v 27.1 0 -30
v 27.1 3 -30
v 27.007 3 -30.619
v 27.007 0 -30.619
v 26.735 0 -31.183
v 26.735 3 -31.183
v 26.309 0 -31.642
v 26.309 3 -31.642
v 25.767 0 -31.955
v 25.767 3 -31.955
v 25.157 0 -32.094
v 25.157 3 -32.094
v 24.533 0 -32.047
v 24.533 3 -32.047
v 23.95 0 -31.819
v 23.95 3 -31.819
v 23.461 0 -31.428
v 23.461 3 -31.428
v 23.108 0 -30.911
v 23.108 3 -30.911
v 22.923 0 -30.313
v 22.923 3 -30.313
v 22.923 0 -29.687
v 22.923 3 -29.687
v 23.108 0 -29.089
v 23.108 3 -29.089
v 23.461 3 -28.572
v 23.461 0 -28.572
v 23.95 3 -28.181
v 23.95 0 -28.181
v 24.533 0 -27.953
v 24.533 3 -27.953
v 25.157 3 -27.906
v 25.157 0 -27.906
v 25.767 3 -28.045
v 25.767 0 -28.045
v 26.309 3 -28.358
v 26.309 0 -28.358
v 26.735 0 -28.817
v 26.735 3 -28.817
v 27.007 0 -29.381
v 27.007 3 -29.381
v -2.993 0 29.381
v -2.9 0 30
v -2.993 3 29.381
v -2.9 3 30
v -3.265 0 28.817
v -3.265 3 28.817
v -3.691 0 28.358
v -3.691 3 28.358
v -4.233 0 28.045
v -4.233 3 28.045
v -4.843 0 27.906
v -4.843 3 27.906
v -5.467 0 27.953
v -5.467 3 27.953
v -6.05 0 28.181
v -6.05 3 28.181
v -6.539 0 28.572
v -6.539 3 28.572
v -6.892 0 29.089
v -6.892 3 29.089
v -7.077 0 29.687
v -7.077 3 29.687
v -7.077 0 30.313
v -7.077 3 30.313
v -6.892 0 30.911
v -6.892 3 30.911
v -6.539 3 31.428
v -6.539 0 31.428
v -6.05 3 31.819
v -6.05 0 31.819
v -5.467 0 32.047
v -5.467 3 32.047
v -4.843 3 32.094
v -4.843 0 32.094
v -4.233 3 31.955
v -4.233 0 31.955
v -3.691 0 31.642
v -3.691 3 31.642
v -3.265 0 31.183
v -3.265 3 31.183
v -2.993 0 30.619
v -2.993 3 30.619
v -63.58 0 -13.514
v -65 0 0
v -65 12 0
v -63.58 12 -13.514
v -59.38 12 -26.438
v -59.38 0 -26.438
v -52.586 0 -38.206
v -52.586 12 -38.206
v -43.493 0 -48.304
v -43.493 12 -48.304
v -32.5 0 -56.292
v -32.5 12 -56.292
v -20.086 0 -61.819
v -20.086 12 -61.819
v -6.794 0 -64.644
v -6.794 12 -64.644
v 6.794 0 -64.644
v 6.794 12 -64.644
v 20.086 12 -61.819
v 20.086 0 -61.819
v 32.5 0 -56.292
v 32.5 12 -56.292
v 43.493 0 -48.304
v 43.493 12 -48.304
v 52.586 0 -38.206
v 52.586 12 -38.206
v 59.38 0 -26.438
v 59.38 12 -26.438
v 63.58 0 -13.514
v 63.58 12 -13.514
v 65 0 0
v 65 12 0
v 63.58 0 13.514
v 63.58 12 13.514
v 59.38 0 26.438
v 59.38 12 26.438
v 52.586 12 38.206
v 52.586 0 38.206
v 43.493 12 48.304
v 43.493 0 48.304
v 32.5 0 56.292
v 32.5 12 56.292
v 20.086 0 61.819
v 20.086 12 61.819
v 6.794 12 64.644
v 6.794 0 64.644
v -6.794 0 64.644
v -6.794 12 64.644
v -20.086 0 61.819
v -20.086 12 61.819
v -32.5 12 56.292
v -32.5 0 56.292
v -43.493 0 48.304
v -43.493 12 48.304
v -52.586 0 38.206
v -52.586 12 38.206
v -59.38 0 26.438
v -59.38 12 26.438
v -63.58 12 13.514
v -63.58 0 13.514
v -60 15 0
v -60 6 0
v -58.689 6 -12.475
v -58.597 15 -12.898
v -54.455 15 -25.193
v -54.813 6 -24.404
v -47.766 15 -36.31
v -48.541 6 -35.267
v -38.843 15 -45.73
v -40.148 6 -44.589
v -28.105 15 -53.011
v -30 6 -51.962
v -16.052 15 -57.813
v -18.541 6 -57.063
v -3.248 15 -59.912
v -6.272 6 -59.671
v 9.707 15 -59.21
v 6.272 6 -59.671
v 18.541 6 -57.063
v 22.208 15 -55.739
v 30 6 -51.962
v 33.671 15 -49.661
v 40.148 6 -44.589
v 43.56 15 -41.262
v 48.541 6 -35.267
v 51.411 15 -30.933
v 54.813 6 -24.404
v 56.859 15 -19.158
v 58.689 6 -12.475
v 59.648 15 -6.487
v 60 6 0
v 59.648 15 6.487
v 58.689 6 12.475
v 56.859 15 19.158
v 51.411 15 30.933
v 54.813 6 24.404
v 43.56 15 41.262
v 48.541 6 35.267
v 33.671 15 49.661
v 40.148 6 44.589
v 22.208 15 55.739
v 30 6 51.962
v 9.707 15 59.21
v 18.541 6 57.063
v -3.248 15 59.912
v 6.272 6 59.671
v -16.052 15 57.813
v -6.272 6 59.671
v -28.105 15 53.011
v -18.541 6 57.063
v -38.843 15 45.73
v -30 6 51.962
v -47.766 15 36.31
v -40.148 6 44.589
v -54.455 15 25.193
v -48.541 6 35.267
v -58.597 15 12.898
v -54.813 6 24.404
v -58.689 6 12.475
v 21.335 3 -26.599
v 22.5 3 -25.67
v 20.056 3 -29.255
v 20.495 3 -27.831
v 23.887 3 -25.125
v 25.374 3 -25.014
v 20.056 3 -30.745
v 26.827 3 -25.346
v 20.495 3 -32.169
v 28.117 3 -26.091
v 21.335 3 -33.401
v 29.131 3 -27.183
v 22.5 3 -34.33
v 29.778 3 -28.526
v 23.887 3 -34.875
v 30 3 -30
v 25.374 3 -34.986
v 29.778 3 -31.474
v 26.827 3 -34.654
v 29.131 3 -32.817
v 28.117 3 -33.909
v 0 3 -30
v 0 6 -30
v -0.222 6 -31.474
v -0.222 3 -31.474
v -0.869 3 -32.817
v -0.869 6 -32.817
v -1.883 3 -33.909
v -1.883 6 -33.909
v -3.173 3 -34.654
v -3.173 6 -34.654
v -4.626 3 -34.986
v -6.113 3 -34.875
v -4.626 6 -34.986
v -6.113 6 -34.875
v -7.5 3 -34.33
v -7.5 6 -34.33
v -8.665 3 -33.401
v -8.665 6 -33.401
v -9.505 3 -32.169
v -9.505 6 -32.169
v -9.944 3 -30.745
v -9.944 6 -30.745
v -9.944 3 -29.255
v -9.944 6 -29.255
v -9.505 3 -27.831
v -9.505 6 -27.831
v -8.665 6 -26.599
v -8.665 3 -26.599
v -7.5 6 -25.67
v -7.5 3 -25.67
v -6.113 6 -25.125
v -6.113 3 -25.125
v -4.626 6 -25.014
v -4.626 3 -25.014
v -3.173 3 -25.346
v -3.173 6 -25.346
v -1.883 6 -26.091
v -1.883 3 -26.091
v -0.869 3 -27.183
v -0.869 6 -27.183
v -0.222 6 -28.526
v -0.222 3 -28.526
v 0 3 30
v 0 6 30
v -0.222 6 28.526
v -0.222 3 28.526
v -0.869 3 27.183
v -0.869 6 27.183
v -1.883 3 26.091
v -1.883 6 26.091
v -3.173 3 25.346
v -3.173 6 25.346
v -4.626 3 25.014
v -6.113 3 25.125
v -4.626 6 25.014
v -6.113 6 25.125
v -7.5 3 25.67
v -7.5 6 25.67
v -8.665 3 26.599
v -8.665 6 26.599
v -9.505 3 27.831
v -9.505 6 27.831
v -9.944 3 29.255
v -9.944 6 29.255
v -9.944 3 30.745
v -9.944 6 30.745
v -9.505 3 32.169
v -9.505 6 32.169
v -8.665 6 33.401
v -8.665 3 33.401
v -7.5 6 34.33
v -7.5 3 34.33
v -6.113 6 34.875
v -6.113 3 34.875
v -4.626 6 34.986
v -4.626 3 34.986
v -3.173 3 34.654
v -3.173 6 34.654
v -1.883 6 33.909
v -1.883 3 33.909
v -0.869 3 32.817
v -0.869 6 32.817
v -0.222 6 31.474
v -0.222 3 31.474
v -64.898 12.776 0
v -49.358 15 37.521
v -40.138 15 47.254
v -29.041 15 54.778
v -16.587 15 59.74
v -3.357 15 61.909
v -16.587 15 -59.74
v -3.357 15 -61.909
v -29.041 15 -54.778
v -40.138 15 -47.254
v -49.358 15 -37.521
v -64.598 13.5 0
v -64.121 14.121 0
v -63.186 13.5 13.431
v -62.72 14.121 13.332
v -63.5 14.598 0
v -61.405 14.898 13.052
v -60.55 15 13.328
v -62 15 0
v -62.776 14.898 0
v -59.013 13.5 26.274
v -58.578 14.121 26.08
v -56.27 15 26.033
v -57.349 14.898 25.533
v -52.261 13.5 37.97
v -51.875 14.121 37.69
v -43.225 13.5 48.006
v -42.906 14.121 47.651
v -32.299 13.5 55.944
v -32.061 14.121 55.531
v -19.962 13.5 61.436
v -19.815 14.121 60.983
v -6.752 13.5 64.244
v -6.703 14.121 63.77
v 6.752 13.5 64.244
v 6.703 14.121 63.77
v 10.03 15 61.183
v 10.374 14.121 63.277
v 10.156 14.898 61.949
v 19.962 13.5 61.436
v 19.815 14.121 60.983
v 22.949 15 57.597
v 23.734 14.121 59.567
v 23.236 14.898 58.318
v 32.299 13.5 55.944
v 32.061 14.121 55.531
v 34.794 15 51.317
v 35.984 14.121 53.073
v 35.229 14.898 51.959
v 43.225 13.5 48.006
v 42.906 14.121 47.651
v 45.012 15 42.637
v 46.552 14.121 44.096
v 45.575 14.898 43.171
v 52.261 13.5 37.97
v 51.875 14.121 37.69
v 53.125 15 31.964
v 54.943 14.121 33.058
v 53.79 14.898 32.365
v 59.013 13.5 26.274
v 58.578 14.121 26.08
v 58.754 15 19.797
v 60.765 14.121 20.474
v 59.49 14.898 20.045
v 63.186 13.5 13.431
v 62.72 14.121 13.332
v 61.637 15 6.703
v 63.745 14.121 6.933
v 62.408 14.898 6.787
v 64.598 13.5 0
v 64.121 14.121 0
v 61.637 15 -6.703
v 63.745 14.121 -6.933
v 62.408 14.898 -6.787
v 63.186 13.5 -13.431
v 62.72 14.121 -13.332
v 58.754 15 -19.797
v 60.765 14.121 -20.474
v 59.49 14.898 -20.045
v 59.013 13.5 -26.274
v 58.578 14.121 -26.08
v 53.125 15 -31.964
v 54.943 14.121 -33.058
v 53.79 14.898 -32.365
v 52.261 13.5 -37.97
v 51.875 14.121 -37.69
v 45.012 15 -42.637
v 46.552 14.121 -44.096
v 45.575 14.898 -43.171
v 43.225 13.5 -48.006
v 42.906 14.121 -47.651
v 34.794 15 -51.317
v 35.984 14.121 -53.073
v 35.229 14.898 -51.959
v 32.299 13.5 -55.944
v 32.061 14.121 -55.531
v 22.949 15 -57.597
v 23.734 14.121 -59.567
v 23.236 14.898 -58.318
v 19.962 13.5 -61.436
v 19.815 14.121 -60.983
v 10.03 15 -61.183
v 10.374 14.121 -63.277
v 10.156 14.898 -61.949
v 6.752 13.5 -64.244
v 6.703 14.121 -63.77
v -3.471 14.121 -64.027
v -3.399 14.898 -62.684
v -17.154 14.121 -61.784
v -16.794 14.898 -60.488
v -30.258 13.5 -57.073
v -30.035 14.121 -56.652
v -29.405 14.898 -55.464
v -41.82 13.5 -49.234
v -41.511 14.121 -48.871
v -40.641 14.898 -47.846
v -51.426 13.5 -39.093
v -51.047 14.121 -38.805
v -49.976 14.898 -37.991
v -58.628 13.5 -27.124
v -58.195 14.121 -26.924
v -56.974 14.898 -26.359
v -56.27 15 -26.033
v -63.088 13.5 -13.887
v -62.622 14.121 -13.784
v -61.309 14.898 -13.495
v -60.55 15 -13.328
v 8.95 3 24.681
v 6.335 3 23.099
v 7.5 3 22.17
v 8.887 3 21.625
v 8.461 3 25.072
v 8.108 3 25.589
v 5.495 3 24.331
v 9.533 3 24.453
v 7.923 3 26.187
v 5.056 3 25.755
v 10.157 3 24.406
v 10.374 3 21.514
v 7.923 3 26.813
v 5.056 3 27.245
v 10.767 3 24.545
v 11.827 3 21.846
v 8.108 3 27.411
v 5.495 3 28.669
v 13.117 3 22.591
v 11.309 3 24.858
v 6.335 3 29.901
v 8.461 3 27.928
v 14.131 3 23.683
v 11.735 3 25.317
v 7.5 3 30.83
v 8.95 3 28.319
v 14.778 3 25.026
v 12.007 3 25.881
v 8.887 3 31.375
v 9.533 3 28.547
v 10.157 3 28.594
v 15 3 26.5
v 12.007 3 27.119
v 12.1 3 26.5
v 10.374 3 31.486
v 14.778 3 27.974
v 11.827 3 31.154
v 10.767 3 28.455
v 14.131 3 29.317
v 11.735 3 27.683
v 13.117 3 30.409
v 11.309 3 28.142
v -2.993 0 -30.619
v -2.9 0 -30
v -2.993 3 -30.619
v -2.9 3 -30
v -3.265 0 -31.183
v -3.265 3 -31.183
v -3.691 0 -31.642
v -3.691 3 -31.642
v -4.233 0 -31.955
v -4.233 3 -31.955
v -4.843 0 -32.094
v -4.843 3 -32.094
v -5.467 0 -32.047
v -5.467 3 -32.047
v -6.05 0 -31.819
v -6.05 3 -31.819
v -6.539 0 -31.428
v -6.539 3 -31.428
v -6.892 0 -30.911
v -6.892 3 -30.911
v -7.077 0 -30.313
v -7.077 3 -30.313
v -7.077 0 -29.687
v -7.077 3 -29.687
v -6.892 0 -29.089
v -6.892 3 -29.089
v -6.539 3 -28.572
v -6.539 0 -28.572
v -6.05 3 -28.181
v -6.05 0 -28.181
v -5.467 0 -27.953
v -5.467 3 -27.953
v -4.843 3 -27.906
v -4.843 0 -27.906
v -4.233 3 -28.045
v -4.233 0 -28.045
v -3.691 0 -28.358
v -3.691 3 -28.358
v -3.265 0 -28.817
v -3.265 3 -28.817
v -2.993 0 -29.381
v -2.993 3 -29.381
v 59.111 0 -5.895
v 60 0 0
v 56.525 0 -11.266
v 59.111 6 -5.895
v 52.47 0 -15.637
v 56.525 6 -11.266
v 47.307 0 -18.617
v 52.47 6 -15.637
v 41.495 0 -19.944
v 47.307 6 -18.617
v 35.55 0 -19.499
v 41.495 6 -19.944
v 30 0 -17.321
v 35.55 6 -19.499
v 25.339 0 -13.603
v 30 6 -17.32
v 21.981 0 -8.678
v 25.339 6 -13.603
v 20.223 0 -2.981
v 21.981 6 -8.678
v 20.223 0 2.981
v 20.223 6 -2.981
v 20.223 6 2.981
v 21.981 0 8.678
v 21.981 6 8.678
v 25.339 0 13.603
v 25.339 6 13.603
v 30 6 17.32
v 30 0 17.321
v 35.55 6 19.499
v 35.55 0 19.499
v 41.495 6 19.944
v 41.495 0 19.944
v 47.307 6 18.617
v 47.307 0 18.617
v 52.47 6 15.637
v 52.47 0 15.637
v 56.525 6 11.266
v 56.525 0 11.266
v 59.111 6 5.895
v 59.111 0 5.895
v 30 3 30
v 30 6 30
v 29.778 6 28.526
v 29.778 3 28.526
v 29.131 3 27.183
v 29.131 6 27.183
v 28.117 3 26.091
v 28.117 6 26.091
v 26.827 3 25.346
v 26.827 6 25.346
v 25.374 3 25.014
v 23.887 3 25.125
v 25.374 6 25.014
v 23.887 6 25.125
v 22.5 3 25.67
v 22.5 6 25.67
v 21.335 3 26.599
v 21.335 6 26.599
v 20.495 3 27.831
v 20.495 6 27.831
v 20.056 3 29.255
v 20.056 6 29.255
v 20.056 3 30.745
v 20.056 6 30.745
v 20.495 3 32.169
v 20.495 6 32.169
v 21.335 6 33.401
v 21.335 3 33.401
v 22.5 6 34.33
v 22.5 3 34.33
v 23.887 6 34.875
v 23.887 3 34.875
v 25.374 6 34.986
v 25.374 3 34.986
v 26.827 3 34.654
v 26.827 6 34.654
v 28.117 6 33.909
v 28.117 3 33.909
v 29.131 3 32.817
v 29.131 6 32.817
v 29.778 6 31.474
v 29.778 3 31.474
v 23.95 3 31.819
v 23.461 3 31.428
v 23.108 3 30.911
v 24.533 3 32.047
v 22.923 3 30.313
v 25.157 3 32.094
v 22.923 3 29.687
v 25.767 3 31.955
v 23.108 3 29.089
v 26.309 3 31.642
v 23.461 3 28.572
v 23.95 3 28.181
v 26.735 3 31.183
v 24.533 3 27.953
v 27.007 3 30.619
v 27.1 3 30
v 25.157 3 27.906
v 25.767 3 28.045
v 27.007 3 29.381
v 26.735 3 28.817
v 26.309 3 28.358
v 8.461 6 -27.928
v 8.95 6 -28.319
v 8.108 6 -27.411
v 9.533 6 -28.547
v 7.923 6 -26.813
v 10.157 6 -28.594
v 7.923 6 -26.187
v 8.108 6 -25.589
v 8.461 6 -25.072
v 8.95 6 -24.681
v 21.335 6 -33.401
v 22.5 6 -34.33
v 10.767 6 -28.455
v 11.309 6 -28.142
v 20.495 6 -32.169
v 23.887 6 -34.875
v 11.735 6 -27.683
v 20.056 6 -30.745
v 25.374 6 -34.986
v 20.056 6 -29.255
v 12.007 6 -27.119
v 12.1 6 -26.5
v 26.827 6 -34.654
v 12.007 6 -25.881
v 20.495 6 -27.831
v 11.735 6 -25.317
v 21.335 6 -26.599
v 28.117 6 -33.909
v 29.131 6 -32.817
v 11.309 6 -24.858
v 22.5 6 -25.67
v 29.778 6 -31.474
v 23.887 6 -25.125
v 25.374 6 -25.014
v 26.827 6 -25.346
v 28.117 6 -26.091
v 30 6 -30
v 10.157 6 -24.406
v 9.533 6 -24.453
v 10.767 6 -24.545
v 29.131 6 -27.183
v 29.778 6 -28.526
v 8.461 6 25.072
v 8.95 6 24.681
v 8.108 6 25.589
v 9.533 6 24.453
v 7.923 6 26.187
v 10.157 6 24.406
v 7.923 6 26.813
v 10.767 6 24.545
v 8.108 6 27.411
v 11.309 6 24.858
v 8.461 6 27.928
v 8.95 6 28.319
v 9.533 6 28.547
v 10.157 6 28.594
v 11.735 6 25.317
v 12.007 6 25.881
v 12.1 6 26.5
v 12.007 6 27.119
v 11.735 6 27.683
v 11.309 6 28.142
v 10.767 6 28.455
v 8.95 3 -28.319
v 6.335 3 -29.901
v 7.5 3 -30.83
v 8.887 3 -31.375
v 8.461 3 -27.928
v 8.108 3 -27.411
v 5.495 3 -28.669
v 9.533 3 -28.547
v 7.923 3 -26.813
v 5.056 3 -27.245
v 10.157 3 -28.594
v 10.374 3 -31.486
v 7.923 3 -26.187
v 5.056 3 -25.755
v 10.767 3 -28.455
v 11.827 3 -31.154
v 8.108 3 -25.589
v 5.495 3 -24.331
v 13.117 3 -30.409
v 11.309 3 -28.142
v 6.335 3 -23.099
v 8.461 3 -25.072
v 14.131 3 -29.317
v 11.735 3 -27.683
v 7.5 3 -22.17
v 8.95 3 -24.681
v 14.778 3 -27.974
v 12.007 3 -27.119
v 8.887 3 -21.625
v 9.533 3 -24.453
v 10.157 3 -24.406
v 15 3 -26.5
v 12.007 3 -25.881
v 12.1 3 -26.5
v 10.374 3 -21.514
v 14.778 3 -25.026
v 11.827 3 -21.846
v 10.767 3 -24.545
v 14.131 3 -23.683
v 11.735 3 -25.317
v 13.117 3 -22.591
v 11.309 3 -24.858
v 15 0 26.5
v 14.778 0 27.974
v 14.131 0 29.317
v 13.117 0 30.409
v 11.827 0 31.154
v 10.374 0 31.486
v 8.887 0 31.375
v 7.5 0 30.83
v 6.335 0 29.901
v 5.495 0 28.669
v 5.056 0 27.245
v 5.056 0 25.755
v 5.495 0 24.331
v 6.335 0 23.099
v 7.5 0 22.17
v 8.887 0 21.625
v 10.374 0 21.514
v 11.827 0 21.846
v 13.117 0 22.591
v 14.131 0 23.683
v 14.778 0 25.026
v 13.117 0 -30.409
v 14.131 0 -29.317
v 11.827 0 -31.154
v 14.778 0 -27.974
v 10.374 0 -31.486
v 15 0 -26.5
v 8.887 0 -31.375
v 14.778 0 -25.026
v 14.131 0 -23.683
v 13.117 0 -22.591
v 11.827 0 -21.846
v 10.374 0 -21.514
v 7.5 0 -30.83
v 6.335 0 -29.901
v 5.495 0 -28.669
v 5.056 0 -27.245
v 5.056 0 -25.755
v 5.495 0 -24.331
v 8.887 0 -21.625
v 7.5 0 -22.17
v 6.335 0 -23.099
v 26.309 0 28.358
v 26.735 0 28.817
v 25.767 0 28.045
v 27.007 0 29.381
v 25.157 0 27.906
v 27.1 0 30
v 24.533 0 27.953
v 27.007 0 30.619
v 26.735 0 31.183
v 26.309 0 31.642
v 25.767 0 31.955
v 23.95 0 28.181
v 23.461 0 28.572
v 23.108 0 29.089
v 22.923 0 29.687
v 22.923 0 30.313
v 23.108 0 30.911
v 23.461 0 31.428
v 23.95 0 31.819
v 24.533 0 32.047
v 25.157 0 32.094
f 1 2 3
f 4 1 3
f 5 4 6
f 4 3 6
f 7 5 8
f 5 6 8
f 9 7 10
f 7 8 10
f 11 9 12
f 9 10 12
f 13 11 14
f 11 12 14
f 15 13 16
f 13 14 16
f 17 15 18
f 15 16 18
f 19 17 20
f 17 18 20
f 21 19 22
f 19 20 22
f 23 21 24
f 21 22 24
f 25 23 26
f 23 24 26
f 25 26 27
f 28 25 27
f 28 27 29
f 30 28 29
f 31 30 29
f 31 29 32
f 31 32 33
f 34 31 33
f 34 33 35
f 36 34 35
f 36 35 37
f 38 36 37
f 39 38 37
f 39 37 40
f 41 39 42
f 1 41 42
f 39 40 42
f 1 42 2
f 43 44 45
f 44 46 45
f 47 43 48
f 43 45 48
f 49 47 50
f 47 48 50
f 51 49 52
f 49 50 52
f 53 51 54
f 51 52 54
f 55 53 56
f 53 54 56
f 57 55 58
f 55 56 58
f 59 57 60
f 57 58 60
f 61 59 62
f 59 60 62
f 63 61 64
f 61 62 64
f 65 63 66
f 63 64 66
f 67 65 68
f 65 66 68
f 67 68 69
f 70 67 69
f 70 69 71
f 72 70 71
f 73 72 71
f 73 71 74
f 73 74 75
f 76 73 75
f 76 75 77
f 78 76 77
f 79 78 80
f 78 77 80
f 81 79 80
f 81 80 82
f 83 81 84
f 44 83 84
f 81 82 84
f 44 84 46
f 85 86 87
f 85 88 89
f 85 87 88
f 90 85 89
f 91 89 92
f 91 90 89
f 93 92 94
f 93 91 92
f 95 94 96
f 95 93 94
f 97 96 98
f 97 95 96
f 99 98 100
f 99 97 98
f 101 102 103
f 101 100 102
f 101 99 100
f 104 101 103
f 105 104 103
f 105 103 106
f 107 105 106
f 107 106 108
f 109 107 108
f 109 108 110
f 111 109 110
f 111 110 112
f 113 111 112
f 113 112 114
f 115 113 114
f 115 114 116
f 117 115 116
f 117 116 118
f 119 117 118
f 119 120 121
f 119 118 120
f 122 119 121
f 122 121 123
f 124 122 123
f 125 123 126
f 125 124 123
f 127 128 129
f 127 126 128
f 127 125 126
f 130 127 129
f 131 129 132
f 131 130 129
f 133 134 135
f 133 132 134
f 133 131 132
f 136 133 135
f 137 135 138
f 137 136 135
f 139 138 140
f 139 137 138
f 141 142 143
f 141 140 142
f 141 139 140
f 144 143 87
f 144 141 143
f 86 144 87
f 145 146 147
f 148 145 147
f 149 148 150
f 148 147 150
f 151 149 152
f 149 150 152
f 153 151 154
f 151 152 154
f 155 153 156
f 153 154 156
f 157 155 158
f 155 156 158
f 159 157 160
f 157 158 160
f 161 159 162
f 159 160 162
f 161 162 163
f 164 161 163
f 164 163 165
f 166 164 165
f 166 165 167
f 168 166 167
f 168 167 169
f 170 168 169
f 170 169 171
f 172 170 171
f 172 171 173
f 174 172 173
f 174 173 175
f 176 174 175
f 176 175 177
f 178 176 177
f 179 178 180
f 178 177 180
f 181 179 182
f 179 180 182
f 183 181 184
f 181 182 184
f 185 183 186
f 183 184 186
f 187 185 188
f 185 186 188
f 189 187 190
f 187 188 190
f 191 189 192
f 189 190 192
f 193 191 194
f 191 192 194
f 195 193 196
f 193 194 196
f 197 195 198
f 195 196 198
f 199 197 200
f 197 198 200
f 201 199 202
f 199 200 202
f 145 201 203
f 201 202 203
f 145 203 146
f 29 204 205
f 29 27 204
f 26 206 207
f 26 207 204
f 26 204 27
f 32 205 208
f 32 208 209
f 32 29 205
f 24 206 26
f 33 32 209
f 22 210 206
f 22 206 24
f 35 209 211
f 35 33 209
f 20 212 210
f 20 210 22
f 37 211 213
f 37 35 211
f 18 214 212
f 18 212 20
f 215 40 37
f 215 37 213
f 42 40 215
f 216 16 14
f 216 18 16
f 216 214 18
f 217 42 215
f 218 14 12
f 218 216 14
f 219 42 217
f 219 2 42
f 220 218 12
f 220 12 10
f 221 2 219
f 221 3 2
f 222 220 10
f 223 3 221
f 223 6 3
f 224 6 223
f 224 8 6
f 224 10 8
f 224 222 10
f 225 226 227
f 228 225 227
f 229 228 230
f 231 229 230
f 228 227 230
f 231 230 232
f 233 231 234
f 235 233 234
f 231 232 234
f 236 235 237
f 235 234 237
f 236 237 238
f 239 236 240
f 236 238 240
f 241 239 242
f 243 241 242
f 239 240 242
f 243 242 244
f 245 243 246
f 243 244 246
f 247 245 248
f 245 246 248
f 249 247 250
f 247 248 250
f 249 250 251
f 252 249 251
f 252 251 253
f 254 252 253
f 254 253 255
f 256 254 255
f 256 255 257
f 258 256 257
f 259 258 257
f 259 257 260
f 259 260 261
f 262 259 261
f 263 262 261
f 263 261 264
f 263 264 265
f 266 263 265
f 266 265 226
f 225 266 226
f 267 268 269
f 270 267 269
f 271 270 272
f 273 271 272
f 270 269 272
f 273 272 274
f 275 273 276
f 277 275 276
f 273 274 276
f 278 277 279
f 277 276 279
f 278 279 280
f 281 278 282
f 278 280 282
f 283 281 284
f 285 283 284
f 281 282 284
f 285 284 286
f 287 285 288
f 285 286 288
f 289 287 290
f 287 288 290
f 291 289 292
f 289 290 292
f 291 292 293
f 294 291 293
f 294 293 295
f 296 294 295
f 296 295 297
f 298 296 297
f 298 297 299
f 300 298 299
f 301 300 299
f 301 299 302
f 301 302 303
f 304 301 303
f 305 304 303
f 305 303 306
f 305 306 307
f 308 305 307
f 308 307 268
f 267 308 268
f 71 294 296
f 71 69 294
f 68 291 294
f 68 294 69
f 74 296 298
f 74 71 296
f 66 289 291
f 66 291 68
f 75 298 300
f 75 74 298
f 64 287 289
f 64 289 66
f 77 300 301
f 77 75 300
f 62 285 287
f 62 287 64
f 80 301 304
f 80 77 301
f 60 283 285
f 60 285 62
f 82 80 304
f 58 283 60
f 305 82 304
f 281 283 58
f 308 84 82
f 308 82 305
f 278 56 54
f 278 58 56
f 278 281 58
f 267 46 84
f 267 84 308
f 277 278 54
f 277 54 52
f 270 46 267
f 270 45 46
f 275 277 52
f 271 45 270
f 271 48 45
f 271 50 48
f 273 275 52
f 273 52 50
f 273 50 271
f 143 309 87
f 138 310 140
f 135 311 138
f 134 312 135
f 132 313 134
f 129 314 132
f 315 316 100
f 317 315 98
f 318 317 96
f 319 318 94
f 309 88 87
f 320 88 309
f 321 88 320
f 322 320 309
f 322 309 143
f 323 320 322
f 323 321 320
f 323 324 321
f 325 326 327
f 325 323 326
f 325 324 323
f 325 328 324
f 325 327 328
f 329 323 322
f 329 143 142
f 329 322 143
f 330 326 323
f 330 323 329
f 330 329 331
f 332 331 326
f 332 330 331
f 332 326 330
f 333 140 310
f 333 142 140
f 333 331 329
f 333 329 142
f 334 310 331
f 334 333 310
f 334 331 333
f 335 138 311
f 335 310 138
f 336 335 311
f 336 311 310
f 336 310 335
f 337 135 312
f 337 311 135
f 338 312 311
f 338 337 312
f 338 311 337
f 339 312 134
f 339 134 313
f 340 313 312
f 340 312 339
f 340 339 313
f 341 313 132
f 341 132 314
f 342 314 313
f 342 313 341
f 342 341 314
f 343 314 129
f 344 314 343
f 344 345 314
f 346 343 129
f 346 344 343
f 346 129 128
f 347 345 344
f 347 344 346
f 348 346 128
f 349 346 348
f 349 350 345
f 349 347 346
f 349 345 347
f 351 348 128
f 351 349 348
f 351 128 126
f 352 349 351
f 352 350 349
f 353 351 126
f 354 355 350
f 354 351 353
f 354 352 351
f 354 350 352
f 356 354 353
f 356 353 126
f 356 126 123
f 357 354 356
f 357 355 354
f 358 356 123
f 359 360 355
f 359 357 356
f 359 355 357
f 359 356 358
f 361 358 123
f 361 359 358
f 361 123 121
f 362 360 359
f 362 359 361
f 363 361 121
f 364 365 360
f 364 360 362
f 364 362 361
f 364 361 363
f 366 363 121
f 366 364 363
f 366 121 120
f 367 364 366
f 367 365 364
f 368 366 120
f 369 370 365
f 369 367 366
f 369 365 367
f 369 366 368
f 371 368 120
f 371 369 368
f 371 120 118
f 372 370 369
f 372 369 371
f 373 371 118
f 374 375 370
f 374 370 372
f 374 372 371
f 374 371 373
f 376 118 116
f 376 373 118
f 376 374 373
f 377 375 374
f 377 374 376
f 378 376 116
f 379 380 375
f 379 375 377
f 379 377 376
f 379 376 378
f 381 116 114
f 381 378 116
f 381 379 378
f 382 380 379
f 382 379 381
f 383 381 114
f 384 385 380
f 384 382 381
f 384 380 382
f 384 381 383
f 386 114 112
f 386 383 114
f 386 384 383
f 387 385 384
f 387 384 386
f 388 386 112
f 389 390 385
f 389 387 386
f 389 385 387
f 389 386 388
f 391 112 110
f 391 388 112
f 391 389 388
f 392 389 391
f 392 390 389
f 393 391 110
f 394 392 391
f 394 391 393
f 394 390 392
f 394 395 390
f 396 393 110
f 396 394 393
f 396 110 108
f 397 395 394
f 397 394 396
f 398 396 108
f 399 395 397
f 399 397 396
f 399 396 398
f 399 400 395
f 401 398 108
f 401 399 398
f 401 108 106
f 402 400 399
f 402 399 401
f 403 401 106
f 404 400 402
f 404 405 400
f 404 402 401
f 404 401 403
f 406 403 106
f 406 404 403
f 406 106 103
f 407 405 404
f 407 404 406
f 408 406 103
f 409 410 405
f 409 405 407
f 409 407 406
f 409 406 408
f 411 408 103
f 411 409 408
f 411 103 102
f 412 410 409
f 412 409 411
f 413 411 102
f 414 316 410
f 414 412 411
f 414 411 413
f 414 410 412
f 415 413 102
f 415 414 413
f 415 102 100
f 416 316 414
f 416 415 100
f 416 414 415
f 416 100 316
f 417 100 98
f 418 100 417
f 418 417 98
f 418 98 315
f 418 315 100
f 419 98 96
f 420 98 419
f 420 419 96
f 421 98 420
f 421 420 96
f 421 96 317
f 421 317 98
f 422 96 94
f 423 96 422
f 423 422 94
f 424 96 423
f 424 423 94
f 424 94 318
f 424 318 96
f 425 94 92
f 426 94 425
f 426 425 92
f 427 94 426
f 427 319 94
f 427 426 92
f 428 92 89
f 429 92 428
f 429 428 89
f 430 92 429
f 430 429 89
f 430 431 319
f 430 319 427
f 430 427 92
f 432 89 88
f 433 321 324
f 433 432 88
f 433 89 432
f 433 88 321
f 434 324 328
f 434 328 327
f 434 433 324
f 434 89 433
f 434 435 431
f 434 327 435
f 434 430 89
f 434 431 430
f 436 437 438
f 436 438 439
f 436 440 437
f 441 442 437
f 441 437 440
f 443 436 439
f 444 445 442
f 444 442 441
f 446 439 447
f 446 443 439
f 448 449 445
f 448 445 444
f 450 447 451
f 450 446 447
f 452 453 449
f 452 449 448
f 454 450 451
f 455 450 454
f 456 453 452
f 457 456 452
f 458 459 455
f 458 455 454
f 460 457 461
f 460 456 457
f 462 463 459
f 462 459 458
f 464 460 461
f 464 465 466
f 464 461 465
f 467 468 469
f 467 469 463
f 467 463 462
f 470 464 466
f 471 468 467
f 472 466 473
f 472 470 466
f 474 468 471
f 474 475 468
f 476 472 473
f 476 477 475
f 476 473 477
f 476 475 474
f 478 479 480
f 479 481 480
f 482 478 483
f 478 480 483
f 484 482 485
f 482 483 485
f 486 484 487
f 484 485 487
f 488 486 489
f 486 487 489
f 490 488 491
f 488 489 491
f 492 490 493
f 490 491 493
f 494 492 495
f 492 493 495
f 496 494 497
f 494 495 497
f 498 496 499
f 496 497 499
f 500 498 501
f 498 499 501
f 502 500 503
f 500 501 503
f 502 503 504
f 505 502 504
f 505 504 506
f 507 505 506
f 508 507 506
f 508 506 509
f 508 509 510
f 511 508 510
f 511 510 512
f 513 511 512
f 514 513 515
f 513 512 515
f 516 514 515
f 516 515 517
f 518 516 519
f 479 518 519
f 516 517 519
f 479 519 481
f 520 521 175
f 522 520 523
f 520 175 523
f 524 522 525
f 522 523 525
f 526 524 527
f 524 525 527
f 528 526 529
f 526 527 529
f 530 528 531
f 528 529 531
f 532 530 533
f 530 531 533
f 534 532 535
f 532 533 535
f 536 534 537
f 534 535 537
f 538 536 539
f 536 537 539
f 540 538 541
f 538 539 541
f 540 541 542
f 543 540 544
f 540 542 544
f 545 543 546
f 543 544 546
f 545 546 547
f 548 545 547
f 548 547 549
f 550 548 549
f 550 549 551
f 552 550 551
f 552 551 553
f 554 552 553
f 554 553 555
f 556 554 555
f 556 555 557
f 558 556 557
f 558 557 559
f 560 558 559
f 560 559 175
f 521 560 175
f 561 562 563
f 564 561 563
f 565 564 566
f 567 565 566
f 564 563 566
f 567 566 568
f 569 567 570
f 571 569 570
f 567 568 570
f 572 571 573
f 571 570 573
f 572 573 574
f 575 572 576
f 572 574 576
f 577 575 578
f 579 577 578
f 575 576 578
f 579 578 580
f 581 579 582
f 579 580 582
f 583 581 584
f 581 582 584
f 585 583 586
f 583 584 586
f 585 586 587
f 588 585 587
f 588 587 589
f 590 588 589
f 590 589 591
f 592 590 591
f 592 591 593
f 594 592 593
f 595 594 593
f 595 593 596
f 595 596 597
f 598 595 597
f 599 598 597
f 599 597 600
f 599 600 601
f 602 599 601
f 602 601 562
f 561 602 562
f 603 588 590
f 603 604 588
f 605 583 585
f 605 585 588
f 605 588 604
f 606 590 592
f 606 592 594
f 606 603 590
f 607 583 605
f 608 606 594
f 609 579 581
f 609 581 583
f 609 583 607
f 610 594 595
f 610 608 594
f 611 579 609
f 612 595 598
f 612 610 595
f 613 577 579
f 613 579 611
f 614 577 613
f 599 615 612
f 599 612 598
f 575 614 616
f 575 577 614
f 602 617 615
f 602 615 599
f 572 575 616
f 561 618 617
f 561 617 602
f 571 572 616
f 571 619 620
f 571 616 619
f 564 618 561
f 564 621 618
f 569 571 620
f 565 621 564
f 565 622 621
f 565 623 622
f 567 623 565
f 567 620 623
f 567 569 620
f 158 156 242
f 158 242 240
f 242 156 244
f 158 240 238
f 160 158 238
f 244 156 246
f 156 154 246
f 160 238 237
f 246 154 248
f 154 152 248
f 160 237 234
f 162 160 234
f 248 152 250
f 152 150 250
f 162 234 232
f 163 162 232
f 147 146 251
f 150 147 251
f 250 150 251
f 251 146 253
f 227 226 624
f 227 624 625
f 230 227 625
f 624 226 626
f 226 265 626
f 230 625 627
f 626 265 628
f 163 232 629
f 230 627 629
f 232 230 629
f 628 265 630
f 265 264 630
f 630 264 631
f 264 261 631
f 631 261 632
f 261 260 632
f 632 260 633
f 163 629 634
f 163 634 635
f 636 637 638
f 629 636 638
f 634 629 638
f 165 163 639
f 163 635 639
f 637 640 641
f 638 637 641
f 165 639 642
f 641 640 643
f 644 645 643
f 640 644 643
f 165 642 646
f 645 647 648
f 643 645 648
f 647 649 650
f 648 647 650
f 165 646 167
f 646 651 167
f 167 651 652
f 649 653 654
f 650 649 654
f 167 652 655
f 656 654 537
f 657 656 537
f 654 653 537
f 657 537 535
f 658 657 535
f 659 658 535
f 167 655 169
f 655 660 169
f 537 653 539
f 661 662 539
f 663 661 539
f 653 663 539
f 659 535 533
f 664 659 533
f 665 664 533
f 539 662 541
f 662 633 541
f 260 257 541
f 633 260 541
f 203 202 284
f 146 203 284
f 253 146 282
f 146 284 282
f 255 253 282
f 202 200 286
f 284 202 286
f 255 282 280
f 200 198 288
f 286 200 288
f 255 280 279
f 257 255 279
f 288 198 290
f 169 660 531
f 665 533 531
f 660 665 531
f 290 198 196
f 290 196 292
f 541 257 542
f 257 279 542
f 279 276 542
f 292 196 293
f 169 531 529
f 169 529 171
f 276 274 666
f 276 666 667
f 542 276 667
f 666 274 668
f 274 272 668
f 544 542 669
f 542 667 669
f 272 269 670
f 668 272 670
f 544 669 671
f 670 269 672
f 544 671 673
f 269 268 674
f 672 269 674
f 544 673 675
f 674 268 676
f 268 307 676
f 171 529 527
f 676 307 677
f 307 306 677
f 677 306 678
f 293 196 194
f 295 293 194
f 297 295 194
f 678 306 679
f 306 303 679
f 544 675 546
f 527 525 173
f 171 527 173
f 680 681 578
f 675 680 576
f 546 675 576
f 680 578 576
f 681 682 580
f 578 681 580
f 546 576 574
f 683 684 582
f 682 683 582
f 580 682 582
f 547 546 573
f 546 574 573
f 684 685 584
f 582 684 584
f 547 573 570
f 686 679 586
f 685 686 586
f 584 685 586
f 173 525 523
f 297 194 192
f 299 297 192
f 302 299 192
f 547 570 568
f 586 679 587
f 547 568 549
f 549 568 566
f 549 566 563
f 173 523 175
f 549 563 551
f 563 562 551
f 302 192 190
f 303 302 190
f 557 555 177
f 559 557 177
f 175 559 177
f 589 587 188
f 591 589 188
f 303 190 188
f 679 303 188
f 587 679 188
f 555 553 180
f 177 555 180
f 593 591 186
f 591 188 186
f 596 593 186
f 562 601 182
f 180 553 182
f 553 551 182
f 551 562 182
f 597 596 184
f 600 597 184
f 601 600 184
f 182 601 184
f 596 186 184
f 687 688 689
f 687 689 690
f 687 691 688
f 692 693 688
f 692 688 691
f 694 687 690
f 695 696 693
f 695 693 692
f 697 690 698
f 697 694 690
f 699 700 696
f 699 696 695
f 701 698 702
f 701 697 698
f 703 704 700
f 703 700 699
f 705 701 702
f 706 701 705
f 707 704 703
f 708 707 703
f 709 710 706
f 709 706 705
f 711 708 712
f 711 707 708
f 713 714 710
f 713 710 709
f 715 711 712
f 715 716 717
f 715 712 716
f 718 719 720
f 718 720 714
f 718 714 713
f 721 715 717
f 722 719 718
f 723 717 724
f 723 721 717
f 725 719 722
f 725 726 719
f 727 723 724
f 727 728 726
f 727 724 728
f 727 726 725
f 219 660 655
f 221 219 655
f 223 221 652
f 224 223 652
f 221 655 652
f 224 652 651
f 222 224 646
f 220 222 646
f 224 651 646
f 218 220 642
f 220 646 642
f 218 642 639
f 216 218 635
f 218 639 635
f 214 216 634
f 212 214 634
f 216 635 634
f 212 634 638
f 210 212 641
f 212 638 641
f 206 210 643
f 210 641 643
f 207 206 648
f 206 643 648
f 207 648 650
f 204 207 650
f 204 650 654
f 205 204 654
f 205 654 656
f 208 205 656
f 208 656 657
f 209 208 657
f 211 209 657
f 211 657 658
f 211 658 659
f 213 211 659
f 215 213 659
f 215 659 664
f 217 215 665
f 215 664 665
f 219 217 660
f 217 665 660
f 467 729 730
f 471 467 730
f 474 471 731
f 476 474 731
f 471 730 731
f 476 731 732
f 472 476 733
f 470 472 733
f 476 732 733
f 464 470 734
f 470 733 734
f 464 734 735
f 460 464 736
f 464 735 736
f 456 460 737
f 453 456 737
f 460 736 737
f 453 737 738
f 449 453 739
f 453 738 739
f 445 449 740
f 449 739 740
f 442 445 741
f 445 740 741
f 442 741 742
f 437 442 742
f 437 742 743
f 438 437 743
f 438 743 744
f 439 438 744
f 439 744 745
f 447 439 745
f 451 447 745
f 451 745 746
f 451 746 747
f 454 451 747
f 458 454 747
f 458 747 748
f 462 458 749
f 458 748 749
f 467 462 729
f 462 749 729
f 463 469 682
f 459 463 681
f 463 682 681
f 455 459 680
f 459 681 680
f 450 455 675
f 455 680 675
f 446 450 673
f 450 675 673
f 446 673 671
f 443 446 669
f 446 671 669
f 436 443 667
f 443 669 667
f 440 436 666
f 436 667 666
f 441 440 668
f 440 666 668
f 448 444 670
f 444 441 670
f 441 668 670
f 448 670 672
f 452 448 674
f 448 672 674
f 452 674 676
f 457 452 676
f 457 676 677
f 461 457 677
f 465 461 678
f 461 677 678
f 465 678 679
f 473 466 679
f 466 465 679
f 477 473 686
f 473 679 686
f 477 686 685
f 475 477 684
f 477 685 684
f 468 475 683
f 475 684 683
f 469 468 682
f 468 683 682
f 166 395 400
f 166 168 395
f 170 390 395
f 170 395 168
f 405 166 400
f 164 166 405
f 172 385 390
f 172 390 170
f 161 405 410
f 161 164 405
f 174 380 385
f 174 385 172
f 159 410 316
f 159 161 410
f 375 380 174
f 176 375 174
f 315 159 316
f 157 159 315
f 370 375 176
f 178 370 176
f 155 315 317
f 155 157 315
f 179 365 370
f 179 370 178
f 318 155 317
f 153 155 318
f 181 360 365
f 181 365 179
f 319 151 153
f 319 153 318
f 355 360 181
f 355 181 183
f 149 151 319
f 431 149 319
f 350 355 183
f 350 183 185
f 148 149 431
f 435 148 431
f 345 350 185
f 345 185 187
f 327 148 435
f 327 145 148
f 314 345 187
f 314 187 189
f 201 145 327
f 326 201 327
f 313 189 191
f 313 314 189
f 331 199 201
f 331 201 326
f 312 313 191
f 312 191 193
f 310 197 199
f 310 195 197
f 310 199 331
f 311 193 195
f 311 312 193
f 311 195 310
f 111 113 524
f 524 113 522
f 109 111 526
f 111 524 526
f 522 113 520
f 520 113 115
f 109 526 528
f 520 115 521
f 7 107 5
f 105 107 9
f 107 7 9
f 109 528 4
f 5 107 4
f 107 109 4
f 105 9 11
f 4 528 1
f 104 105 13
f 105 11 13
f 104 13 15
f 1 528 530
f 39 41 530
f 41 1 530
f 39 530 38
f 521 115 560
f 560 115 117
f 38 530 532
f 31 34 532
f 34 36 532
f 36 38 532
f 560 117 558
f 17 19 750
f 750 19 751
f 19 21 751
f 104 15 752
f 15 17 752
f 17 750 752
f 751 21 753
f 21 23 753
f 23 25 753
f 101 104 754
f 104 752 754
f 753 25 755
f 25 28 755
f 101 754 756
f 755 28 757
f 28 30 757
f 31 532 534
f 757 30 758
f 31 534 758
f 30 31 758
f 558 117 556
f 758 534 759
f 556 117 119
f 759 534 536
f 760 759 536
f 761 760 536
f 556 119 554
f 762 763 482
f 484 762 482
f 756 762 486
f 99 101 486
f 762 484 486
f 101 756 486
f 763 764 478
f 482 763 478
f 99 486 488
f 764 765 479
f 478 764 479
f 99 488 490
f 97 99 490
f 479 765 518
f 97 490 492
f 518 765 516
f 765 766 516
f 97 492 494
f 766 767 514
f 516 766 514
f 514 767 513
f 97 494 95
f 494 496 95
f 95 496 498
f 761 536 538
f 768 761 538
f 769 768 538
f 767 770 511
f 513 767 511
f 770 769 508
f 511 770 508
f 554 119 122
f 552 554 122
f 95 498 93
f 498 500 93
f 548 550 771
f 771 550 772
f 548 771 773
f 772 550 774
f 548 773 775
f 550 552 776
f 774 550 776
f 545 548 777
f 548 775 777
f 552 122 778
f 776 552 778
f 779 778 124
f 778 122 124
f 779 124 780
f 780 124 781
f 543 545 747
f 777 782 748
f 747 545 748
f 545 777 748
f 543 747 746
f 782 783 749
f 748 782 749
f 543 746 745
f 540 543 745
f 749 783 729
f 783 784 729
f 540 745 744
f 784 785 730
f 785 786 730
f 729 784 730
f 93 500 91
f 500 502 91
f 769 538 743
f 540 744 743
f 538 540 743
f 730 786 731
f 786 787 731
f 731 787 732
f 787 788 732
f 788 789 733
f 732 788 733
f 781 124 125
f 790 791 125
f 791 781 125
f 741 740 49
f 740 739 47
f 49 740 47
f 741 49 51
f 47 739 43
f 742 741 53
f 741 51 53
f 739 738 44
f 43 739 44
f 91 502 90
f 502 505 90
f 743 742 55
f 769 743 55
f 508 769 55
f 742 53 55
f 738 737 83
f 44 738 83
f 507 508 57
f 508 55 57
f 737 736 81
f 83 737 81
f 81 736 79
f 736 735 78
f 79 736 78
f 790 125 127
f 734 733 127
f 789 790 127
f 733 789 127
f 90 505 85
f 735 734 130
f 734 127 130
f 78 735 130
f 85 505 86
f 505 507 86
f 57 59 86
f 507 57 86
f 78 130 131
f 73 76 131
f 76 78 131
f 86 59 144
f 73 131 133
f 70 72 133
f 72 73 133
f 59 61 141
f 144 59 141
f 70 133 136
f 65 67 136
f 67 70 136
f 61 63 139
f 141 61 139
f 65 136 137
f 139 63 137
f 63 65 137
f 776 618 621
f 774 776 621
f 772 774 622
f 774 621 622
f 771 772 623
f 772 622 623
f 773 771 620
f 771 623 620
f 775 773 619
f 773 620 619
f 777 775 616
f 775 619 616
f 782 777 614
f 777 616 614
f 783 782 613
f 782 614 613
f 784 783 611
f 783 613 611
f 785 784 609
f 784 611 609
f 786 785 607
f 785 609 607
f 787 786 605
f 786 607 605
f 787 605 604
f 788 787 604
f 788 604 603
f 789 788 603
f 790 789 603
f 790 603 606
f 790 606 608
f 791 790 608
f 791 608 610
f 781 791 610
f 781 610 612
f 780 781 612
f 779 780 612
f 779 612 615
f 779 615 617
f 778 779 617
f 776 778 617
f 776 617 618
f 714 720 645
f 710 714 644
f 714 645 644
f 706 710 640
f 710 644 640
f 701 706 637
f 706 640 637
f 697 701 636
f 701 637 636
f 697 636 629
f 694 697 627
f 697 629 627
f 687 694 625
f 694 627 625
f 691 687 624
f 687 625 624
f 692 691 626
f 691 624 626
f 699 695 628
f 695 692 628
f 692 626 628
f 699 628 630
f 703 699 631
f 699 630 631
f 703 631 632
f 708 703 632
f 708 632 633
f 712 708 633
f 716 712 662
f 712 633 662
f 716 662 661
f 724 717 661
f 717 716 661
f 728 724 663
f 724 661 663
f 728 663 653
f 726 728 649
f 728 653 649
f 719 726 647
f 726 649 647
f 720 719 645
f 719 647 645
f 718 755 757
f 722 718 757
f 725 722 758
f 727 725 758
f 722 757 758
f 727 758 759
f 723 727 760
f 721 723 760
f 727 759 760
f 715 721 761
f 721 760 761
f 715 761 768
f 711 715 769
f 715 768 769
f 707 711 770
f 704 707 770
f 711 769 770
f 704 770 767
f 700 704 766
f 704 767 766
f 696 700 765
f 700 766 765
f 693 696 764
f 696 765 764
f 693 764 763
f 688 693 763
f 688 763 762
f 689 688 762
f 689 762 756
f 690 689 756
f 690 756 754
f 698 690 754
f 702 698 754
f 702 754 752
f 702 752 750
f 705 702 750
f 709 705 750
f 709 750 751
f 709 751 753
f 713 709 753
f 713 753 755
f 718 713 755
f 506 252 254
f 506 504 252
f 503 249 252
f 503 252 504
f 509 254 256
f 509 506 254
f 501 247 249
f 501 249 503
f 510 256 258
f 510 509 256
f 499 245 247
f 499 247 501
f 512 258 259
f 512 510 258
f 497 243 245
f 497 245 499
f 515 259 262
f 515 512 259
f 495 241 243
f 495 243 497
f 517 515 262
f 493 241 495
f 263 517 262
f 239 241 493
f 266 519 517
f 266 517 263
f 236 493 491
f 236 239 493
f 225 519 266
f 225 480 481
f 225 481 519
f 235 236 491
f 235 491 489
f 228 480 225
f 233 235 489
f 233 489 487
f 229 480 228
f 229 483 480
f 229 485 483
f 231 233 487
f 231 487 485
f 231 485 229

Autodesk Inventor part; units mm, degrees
ref_plane "YZ Plane" through (0, 0, 0) normal (1, 0, 0) x (0, 1, 0)
ref_plane "XZ Plane" through (0, 0, 0) normal (0, 1, 0) x (-1, 0, 0)
ref_plane "XY Plane" through (0, 0, 0) normal (0, 0, 1) x (1, 0, 0)
sketch "Sketch1" plane through (0, 0, 0) normal (0, 1, 0) x (-1, 0, 0)
  circle A0 centre (0, 0) radius 60
  circle A1 centre (0, 0) radius 65
  dimension "d0" = 120
  dimension "d1" = 130
extrude "Extrusion1" add sketch "Sketch1" along normal blind 15
sketch "Sketch4" plane through (0, 0, 0) normal (0, -1, 0) x (1, 0, 0)
  circle A0 centre (0, 0) radius 60 projected
  circle A1 centre (0, 0) radius 60
extrude "Extrusion4" add sketch "Sketch4" against normal blind 6
sketch "Sketch5" plane through (0, 6, 0) normal (0, 1, 0) x (1, 0, 0)
  circle A0 centre (25, -30) radius 2.1
  circle A1 centre (25, 30) radius 2.1
  circle A2 centre (-5, 30) radius 2.1
  circle A3 centre (-5, -30) radius 2.1
  point P0 (0, 0)
  dimension "d19" = 4.2
  dimension "d20" = 4.2
  dimension "d21" = 4.2
  dimension "d22" = 4.2
  dimension "d23" = 30
  dimension "d24" = 30
  dimension "d25" = 5
  dimension "d26" = 25
extrude "Extrusion5" cut sketch "Sketch5" against normal blind 6
sketch "Sketch6" plane through (0, 6, 0) normal (0, 1, 0) x (1, 0, 0)
  circle A0 centre (10, -26.5) radius 2.1
  circle A1 centre (10, 26.5) radius 2.1
  point P0 (0, 0)
  dimension "d29" = 4.2
  dimension "d30" = 4.2
  dimension "d51" = 26.5
  dimension "d52" = 26.5
  dimension "d54" = 10
extrude "Extrusion6" cut sketch "Sketch6" against normal blind 6
sketch "Sketch7" plane through (0, 6, 0) normal (0, 1, 0) x (1, 0, 0)
  circle A0 centre (40, 0) radius 20
  point P0 (0, 0)
  dimension "d35" = 40
  dimension "d39" = 40
extrude "Extrusion7" cut sketch "Sketch7" against normal blind 6
sketch "Sketch8" plane through (0, 6, 0) normal (0, 1, 0) x (1, 0, 0)
  circle A0 centre (0, 0) radius 60 projected
  circle A1 centre (40, 0) radius 20 projected
  circle A2 centre (25, 30) radius 2.1 projected
  circle A3 centre (-5, 30) radius 2.1 projected
  circle A4 centre (25, -30) radius 2.1 projected
  circle A5 centre (-5, -30) radius 2.1 projected
  circle A6 centre (10, 26.5) radius 2.1 projected
  circle A7 centre (10, -26.5) radius 2.1 projected
  circle A8 centre (25, 30) radius 5
  circle A9 centre (25, -30) radius 5
  circle A10 centre (-5, 30) radius 5
  circle A11 centre (-5, -30) radius 5
  point P0 (60, 0)
  dimension "d40" = 10
  dimension "d41" = 10
  dimension "d42" = 10
  dimension "d43" = 10
extrude "Extrusion8" cut sketch "Sketch8" against normal blind 3 contours A8 | A9 | A10 | A11
sketch "Sketch9" plane through (0, 0, 0) normal (0, -1, 0) x (1, 0, 0)
  circle A0 centre (40, 0) radius 20 projected
  circle A1 centre (10, 26.5) radius 2.1 projected
  circle A2 centre (10, -26.5) radius 2.1 projected
  circle A3 centre (-5, 30) radius 2.1 projected
  circle A4 centre (25, 30) radius 2.1 projected
  circle A5 centre (-5, -30) radius 2.1 projected
  circle A6 centre (25, -30) radius 2.1 projected
  circle A7 centre (0, 0) radius 65 projected
  circle A8 centre (10, 26.5) radius 5
  circle A9 centre (10, -26.5) radius 5
  dimension "d46" = 10
  dimension "d47" = 10
extrude "Extrusion9" cut sketch "Sketch9" against normal blind 3 contours A8 | A9
fillet "Fillet1" radius 3 1 edges at (65, 15, 0)
properties part number "siren"
